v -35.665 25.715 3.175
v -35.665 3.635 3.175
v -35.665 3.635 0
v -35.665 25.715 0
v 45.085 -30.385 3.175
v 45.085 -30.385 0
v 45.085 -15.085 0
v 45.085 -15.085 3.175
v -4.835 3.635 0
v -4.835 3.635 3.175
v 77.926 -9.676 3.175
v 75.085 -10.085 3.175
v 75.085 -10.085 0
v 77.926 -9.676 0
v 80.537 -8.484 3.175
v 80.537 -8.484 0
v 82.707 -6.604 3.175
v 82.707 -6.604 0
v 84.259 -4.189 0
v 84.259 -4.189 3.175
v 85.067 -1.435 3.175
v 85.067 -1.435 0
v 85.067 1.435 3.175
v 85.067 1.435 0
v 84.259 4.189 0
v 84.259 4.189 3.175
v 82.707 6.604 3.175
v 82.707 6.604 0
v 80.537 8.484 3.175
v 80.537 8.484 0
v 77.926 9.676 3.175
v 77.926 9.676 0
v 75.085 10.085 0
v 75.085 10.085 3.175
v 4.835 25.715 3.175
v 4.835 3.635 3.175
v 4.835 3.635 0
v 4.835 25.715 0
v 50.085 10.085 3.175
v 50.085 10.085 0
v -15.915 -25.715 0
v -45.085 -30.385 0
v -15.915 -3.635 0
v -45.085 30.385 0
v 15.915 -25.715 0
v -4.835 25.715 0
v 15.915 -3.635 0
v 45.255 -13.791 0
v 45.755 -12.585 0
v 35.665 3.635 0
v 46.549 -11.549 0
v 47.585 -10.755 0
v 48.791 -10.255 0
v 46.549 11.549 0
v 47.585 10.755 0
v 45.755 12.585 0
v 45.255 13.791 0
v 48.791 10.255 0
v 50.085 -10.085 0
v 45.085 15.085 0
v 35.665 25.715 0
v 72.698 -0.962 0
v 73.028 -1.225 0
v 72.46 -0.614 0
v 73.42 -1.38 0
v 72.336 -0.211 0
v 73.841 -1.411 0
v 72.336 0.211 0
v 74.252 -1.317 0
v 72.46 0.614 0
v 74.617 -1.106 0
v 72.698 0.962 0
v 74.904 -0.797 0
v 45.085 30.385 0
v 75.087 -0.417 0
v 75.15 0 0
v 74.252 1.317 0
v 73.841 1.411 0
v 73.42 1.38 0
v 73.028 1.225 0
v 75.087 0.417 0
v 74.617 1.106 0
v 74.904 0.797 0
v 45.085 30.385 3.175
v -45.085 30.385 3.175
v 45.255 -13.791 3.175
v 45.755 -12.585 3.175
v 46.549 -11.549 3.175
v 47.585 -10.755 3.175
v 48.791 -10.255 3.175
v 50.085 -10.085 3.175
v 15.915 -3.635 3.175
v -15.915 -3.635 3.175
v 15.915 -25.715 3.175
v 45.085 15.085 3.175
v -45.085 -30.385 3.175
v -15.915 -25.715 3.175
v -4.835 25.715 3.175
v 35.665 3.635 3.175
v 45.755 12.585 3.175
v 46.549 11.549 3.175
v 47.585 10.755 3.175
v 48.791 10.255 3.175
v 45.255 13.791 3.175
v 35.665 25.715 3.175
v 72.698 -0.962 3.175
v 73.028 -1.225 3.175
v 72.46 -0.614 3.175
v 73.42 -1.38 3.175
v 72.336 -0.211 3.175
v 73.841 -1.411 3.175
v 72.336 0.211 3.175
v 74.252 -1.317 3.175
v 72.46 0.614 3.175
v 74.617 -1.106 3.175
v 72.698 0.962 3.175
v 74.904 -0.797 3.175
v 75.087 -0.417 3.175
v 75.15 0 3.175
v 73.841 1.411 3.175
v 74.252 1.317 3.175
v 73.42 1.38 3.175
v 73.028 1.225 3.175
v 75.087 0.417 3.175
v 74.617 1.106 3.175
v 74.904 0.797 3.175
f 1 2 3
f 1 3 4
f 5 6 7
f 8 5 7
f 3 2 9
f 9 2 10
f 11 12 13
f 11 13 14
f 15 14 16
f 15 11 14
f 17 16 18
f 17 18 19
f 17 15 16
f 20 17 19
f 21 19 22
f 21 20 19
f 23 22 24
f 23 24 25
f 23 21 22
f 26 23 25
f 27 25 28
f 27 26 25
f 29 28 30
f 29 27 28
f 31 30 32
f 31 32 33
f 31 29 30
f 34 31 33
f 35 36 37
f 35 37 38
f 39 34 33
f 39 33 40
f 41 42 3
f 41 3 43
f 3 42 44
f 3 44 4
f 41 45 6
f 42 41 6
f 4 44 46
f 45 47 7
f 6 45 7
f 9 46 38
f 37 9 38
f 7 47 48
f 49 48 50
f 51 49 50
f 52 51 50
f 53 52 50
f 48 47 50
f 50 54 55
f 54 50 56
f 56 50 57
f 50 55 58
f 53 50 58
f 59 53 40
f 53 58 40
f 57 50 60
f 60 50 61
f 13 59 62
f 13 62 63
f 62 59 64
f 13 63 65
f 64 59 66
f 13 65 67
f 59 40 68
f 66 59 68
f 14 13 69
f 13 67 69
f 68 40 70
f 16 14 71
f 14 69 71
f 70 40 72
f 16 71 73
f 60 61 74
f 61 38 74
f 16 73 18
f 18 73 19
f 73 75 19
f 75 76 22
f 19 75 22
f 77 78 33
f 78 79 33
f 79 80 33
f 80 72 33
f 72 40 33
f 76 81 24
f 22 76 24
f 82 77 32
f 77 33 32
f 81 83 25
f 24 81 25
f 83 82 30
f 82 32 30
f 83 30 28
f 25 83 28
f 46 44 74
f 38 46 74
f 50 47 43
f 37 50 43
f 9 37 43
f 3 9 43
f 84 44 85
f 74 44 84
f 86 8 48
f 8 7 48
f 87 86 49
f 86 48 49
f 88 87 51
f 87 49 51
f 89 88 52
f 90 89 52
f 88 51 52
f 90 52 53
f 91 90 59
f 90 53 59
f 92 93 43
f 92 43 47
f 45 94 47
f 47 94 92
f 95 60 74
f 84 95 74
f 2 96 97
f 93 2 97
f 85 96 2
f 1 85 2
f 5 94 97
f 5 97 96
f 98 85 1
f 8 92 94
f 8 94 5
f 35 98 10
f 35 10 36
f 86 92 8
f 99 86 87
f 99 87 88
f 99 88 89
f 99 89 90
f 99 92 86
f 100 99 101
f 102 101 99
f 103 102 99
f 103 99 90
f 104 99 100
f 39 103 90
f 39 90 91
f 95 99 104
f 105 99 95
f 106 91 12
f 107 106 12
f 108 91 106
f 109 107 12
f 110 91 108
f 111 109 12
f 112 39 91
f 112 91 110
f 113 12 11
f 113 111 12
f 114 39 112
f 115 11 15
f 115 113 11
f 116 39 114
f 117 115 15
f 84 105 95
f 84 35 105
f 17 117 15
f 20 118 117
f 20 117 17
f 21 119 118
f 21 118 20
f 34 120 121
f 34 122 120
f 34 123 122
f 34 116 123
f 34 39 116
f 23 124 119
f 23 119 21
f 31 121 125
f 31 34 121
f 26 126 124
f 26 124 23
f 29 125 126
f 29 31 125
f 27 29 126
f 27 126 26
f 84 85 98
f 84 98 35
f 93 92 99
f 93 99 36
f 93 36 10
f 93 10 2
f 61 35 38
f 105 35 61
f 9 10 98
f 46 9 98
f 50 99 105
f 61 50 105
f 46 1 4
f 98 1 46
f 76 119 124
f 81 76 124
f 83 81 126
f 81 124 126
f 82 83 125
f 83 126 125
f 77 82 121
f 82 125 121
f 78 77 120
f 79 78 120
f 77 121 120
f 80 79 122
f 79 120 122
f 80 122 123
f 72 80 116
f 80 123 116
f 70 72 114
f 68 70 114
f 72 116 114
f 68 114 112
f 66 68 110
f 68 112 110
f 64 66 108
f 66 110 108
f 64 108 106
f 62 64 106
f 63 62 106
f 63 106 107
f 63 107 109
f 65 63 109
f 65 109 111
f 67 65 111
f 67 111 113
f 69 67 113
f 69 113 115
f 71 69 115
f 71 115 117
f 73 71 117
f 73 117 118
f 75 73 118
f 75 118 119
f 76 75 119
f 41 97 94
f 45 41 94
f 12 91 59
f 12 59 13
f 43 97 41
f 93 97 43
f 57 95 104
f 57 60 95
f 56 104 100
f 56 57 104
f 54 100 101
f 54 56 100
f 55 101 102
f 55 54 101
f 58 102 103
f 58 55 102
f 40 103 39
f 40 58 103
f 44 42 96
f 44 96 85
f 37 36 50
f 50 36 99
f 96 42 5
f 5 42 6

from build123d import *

# Parameters (mm, degrees)
SKETCH1_W           = 90.17
SKETCH1_H           = 60.77
BOSS_EXTRUDE1_DEPTH = 3.175
SKETCH2_W           = 30.83
SKETCH2_H           = 22.08
SKETCH2_W_2         = 31.83
CUT_EXTRUDE1_DEPTH  = 4.175
BOSS_EXTRUDE2_DEPTH = 3.175
FILLET1_R           = 5
SKETCH5_R           = 1.415
CUT_EXTRUDE2_DEPTH  = 10


with BuildPart() as part:
    # Sketch1 → Boss-Extrude1 (new body)
    with BuildSketch(Plane.XY):
        Rectangle(SKETCH1_W, SKETCH1_H)
    extrude(amount=BOSS_EXTRUDE1_DEPTH)

    # Sketch2 → Cut-Extrude1 (cut, through all)
    with BuildSketch(Plane.XY.offset(3.175)):
        with Locations((20.25, 14.675)):
            Rectangle(SKETCH2_W, SKETCH2_H)
        with Locations((-20.25, 14.675)):
            Rectangle(SKETCH2_W, SKETCH2_H)
        with Locations((0, -14.675)):
            Rectangle(SKETCH2_W_2, SKETCH2_H)
    extrude(amount=-CUT_EXTRUDE1_DEPTH, mode=Mode.SUBTRACT)

    # Sketch3 → Boss-Extrude2 (add)
    with BuildSketch(Plane.XY.offset(3.175)):
        with BuildLine():
            Line((45.085, 10.085), (45.085, -10.085))
            Line((45.085, -10.085), (75.085, -10.085))
            ThreePointArc((75.085, -10.085), (85.17, 0), (75.085, 10.085))
            Line((75.085, 10.085), (45.085, 10.085))
        make_face()
    extrude(amount=-BOSS_EXTRUDE2_DEPTH)

    # Fillet1
    fillet1_edges = [part.edges().sort_by_distance(p)[0] for p in [
        (45.085, -10.085, 1.5875),
        (45.085, 10.085, 1.5875),
    ]]
    fillet(fillet1_edges, radius=FILLET1_R)

    # Sketch5 → Cut-Extrude2 (cut)
    with BuildSketch(Plane.XY.offset(3.175)):
        with Locations((73.735, 0)):
            Circle(SKETCH5_R)
    extrude(amount=-CUT_EXTRUDE2_DEPTH, mode=Mode.SUBTRACT)


solid = part.part
